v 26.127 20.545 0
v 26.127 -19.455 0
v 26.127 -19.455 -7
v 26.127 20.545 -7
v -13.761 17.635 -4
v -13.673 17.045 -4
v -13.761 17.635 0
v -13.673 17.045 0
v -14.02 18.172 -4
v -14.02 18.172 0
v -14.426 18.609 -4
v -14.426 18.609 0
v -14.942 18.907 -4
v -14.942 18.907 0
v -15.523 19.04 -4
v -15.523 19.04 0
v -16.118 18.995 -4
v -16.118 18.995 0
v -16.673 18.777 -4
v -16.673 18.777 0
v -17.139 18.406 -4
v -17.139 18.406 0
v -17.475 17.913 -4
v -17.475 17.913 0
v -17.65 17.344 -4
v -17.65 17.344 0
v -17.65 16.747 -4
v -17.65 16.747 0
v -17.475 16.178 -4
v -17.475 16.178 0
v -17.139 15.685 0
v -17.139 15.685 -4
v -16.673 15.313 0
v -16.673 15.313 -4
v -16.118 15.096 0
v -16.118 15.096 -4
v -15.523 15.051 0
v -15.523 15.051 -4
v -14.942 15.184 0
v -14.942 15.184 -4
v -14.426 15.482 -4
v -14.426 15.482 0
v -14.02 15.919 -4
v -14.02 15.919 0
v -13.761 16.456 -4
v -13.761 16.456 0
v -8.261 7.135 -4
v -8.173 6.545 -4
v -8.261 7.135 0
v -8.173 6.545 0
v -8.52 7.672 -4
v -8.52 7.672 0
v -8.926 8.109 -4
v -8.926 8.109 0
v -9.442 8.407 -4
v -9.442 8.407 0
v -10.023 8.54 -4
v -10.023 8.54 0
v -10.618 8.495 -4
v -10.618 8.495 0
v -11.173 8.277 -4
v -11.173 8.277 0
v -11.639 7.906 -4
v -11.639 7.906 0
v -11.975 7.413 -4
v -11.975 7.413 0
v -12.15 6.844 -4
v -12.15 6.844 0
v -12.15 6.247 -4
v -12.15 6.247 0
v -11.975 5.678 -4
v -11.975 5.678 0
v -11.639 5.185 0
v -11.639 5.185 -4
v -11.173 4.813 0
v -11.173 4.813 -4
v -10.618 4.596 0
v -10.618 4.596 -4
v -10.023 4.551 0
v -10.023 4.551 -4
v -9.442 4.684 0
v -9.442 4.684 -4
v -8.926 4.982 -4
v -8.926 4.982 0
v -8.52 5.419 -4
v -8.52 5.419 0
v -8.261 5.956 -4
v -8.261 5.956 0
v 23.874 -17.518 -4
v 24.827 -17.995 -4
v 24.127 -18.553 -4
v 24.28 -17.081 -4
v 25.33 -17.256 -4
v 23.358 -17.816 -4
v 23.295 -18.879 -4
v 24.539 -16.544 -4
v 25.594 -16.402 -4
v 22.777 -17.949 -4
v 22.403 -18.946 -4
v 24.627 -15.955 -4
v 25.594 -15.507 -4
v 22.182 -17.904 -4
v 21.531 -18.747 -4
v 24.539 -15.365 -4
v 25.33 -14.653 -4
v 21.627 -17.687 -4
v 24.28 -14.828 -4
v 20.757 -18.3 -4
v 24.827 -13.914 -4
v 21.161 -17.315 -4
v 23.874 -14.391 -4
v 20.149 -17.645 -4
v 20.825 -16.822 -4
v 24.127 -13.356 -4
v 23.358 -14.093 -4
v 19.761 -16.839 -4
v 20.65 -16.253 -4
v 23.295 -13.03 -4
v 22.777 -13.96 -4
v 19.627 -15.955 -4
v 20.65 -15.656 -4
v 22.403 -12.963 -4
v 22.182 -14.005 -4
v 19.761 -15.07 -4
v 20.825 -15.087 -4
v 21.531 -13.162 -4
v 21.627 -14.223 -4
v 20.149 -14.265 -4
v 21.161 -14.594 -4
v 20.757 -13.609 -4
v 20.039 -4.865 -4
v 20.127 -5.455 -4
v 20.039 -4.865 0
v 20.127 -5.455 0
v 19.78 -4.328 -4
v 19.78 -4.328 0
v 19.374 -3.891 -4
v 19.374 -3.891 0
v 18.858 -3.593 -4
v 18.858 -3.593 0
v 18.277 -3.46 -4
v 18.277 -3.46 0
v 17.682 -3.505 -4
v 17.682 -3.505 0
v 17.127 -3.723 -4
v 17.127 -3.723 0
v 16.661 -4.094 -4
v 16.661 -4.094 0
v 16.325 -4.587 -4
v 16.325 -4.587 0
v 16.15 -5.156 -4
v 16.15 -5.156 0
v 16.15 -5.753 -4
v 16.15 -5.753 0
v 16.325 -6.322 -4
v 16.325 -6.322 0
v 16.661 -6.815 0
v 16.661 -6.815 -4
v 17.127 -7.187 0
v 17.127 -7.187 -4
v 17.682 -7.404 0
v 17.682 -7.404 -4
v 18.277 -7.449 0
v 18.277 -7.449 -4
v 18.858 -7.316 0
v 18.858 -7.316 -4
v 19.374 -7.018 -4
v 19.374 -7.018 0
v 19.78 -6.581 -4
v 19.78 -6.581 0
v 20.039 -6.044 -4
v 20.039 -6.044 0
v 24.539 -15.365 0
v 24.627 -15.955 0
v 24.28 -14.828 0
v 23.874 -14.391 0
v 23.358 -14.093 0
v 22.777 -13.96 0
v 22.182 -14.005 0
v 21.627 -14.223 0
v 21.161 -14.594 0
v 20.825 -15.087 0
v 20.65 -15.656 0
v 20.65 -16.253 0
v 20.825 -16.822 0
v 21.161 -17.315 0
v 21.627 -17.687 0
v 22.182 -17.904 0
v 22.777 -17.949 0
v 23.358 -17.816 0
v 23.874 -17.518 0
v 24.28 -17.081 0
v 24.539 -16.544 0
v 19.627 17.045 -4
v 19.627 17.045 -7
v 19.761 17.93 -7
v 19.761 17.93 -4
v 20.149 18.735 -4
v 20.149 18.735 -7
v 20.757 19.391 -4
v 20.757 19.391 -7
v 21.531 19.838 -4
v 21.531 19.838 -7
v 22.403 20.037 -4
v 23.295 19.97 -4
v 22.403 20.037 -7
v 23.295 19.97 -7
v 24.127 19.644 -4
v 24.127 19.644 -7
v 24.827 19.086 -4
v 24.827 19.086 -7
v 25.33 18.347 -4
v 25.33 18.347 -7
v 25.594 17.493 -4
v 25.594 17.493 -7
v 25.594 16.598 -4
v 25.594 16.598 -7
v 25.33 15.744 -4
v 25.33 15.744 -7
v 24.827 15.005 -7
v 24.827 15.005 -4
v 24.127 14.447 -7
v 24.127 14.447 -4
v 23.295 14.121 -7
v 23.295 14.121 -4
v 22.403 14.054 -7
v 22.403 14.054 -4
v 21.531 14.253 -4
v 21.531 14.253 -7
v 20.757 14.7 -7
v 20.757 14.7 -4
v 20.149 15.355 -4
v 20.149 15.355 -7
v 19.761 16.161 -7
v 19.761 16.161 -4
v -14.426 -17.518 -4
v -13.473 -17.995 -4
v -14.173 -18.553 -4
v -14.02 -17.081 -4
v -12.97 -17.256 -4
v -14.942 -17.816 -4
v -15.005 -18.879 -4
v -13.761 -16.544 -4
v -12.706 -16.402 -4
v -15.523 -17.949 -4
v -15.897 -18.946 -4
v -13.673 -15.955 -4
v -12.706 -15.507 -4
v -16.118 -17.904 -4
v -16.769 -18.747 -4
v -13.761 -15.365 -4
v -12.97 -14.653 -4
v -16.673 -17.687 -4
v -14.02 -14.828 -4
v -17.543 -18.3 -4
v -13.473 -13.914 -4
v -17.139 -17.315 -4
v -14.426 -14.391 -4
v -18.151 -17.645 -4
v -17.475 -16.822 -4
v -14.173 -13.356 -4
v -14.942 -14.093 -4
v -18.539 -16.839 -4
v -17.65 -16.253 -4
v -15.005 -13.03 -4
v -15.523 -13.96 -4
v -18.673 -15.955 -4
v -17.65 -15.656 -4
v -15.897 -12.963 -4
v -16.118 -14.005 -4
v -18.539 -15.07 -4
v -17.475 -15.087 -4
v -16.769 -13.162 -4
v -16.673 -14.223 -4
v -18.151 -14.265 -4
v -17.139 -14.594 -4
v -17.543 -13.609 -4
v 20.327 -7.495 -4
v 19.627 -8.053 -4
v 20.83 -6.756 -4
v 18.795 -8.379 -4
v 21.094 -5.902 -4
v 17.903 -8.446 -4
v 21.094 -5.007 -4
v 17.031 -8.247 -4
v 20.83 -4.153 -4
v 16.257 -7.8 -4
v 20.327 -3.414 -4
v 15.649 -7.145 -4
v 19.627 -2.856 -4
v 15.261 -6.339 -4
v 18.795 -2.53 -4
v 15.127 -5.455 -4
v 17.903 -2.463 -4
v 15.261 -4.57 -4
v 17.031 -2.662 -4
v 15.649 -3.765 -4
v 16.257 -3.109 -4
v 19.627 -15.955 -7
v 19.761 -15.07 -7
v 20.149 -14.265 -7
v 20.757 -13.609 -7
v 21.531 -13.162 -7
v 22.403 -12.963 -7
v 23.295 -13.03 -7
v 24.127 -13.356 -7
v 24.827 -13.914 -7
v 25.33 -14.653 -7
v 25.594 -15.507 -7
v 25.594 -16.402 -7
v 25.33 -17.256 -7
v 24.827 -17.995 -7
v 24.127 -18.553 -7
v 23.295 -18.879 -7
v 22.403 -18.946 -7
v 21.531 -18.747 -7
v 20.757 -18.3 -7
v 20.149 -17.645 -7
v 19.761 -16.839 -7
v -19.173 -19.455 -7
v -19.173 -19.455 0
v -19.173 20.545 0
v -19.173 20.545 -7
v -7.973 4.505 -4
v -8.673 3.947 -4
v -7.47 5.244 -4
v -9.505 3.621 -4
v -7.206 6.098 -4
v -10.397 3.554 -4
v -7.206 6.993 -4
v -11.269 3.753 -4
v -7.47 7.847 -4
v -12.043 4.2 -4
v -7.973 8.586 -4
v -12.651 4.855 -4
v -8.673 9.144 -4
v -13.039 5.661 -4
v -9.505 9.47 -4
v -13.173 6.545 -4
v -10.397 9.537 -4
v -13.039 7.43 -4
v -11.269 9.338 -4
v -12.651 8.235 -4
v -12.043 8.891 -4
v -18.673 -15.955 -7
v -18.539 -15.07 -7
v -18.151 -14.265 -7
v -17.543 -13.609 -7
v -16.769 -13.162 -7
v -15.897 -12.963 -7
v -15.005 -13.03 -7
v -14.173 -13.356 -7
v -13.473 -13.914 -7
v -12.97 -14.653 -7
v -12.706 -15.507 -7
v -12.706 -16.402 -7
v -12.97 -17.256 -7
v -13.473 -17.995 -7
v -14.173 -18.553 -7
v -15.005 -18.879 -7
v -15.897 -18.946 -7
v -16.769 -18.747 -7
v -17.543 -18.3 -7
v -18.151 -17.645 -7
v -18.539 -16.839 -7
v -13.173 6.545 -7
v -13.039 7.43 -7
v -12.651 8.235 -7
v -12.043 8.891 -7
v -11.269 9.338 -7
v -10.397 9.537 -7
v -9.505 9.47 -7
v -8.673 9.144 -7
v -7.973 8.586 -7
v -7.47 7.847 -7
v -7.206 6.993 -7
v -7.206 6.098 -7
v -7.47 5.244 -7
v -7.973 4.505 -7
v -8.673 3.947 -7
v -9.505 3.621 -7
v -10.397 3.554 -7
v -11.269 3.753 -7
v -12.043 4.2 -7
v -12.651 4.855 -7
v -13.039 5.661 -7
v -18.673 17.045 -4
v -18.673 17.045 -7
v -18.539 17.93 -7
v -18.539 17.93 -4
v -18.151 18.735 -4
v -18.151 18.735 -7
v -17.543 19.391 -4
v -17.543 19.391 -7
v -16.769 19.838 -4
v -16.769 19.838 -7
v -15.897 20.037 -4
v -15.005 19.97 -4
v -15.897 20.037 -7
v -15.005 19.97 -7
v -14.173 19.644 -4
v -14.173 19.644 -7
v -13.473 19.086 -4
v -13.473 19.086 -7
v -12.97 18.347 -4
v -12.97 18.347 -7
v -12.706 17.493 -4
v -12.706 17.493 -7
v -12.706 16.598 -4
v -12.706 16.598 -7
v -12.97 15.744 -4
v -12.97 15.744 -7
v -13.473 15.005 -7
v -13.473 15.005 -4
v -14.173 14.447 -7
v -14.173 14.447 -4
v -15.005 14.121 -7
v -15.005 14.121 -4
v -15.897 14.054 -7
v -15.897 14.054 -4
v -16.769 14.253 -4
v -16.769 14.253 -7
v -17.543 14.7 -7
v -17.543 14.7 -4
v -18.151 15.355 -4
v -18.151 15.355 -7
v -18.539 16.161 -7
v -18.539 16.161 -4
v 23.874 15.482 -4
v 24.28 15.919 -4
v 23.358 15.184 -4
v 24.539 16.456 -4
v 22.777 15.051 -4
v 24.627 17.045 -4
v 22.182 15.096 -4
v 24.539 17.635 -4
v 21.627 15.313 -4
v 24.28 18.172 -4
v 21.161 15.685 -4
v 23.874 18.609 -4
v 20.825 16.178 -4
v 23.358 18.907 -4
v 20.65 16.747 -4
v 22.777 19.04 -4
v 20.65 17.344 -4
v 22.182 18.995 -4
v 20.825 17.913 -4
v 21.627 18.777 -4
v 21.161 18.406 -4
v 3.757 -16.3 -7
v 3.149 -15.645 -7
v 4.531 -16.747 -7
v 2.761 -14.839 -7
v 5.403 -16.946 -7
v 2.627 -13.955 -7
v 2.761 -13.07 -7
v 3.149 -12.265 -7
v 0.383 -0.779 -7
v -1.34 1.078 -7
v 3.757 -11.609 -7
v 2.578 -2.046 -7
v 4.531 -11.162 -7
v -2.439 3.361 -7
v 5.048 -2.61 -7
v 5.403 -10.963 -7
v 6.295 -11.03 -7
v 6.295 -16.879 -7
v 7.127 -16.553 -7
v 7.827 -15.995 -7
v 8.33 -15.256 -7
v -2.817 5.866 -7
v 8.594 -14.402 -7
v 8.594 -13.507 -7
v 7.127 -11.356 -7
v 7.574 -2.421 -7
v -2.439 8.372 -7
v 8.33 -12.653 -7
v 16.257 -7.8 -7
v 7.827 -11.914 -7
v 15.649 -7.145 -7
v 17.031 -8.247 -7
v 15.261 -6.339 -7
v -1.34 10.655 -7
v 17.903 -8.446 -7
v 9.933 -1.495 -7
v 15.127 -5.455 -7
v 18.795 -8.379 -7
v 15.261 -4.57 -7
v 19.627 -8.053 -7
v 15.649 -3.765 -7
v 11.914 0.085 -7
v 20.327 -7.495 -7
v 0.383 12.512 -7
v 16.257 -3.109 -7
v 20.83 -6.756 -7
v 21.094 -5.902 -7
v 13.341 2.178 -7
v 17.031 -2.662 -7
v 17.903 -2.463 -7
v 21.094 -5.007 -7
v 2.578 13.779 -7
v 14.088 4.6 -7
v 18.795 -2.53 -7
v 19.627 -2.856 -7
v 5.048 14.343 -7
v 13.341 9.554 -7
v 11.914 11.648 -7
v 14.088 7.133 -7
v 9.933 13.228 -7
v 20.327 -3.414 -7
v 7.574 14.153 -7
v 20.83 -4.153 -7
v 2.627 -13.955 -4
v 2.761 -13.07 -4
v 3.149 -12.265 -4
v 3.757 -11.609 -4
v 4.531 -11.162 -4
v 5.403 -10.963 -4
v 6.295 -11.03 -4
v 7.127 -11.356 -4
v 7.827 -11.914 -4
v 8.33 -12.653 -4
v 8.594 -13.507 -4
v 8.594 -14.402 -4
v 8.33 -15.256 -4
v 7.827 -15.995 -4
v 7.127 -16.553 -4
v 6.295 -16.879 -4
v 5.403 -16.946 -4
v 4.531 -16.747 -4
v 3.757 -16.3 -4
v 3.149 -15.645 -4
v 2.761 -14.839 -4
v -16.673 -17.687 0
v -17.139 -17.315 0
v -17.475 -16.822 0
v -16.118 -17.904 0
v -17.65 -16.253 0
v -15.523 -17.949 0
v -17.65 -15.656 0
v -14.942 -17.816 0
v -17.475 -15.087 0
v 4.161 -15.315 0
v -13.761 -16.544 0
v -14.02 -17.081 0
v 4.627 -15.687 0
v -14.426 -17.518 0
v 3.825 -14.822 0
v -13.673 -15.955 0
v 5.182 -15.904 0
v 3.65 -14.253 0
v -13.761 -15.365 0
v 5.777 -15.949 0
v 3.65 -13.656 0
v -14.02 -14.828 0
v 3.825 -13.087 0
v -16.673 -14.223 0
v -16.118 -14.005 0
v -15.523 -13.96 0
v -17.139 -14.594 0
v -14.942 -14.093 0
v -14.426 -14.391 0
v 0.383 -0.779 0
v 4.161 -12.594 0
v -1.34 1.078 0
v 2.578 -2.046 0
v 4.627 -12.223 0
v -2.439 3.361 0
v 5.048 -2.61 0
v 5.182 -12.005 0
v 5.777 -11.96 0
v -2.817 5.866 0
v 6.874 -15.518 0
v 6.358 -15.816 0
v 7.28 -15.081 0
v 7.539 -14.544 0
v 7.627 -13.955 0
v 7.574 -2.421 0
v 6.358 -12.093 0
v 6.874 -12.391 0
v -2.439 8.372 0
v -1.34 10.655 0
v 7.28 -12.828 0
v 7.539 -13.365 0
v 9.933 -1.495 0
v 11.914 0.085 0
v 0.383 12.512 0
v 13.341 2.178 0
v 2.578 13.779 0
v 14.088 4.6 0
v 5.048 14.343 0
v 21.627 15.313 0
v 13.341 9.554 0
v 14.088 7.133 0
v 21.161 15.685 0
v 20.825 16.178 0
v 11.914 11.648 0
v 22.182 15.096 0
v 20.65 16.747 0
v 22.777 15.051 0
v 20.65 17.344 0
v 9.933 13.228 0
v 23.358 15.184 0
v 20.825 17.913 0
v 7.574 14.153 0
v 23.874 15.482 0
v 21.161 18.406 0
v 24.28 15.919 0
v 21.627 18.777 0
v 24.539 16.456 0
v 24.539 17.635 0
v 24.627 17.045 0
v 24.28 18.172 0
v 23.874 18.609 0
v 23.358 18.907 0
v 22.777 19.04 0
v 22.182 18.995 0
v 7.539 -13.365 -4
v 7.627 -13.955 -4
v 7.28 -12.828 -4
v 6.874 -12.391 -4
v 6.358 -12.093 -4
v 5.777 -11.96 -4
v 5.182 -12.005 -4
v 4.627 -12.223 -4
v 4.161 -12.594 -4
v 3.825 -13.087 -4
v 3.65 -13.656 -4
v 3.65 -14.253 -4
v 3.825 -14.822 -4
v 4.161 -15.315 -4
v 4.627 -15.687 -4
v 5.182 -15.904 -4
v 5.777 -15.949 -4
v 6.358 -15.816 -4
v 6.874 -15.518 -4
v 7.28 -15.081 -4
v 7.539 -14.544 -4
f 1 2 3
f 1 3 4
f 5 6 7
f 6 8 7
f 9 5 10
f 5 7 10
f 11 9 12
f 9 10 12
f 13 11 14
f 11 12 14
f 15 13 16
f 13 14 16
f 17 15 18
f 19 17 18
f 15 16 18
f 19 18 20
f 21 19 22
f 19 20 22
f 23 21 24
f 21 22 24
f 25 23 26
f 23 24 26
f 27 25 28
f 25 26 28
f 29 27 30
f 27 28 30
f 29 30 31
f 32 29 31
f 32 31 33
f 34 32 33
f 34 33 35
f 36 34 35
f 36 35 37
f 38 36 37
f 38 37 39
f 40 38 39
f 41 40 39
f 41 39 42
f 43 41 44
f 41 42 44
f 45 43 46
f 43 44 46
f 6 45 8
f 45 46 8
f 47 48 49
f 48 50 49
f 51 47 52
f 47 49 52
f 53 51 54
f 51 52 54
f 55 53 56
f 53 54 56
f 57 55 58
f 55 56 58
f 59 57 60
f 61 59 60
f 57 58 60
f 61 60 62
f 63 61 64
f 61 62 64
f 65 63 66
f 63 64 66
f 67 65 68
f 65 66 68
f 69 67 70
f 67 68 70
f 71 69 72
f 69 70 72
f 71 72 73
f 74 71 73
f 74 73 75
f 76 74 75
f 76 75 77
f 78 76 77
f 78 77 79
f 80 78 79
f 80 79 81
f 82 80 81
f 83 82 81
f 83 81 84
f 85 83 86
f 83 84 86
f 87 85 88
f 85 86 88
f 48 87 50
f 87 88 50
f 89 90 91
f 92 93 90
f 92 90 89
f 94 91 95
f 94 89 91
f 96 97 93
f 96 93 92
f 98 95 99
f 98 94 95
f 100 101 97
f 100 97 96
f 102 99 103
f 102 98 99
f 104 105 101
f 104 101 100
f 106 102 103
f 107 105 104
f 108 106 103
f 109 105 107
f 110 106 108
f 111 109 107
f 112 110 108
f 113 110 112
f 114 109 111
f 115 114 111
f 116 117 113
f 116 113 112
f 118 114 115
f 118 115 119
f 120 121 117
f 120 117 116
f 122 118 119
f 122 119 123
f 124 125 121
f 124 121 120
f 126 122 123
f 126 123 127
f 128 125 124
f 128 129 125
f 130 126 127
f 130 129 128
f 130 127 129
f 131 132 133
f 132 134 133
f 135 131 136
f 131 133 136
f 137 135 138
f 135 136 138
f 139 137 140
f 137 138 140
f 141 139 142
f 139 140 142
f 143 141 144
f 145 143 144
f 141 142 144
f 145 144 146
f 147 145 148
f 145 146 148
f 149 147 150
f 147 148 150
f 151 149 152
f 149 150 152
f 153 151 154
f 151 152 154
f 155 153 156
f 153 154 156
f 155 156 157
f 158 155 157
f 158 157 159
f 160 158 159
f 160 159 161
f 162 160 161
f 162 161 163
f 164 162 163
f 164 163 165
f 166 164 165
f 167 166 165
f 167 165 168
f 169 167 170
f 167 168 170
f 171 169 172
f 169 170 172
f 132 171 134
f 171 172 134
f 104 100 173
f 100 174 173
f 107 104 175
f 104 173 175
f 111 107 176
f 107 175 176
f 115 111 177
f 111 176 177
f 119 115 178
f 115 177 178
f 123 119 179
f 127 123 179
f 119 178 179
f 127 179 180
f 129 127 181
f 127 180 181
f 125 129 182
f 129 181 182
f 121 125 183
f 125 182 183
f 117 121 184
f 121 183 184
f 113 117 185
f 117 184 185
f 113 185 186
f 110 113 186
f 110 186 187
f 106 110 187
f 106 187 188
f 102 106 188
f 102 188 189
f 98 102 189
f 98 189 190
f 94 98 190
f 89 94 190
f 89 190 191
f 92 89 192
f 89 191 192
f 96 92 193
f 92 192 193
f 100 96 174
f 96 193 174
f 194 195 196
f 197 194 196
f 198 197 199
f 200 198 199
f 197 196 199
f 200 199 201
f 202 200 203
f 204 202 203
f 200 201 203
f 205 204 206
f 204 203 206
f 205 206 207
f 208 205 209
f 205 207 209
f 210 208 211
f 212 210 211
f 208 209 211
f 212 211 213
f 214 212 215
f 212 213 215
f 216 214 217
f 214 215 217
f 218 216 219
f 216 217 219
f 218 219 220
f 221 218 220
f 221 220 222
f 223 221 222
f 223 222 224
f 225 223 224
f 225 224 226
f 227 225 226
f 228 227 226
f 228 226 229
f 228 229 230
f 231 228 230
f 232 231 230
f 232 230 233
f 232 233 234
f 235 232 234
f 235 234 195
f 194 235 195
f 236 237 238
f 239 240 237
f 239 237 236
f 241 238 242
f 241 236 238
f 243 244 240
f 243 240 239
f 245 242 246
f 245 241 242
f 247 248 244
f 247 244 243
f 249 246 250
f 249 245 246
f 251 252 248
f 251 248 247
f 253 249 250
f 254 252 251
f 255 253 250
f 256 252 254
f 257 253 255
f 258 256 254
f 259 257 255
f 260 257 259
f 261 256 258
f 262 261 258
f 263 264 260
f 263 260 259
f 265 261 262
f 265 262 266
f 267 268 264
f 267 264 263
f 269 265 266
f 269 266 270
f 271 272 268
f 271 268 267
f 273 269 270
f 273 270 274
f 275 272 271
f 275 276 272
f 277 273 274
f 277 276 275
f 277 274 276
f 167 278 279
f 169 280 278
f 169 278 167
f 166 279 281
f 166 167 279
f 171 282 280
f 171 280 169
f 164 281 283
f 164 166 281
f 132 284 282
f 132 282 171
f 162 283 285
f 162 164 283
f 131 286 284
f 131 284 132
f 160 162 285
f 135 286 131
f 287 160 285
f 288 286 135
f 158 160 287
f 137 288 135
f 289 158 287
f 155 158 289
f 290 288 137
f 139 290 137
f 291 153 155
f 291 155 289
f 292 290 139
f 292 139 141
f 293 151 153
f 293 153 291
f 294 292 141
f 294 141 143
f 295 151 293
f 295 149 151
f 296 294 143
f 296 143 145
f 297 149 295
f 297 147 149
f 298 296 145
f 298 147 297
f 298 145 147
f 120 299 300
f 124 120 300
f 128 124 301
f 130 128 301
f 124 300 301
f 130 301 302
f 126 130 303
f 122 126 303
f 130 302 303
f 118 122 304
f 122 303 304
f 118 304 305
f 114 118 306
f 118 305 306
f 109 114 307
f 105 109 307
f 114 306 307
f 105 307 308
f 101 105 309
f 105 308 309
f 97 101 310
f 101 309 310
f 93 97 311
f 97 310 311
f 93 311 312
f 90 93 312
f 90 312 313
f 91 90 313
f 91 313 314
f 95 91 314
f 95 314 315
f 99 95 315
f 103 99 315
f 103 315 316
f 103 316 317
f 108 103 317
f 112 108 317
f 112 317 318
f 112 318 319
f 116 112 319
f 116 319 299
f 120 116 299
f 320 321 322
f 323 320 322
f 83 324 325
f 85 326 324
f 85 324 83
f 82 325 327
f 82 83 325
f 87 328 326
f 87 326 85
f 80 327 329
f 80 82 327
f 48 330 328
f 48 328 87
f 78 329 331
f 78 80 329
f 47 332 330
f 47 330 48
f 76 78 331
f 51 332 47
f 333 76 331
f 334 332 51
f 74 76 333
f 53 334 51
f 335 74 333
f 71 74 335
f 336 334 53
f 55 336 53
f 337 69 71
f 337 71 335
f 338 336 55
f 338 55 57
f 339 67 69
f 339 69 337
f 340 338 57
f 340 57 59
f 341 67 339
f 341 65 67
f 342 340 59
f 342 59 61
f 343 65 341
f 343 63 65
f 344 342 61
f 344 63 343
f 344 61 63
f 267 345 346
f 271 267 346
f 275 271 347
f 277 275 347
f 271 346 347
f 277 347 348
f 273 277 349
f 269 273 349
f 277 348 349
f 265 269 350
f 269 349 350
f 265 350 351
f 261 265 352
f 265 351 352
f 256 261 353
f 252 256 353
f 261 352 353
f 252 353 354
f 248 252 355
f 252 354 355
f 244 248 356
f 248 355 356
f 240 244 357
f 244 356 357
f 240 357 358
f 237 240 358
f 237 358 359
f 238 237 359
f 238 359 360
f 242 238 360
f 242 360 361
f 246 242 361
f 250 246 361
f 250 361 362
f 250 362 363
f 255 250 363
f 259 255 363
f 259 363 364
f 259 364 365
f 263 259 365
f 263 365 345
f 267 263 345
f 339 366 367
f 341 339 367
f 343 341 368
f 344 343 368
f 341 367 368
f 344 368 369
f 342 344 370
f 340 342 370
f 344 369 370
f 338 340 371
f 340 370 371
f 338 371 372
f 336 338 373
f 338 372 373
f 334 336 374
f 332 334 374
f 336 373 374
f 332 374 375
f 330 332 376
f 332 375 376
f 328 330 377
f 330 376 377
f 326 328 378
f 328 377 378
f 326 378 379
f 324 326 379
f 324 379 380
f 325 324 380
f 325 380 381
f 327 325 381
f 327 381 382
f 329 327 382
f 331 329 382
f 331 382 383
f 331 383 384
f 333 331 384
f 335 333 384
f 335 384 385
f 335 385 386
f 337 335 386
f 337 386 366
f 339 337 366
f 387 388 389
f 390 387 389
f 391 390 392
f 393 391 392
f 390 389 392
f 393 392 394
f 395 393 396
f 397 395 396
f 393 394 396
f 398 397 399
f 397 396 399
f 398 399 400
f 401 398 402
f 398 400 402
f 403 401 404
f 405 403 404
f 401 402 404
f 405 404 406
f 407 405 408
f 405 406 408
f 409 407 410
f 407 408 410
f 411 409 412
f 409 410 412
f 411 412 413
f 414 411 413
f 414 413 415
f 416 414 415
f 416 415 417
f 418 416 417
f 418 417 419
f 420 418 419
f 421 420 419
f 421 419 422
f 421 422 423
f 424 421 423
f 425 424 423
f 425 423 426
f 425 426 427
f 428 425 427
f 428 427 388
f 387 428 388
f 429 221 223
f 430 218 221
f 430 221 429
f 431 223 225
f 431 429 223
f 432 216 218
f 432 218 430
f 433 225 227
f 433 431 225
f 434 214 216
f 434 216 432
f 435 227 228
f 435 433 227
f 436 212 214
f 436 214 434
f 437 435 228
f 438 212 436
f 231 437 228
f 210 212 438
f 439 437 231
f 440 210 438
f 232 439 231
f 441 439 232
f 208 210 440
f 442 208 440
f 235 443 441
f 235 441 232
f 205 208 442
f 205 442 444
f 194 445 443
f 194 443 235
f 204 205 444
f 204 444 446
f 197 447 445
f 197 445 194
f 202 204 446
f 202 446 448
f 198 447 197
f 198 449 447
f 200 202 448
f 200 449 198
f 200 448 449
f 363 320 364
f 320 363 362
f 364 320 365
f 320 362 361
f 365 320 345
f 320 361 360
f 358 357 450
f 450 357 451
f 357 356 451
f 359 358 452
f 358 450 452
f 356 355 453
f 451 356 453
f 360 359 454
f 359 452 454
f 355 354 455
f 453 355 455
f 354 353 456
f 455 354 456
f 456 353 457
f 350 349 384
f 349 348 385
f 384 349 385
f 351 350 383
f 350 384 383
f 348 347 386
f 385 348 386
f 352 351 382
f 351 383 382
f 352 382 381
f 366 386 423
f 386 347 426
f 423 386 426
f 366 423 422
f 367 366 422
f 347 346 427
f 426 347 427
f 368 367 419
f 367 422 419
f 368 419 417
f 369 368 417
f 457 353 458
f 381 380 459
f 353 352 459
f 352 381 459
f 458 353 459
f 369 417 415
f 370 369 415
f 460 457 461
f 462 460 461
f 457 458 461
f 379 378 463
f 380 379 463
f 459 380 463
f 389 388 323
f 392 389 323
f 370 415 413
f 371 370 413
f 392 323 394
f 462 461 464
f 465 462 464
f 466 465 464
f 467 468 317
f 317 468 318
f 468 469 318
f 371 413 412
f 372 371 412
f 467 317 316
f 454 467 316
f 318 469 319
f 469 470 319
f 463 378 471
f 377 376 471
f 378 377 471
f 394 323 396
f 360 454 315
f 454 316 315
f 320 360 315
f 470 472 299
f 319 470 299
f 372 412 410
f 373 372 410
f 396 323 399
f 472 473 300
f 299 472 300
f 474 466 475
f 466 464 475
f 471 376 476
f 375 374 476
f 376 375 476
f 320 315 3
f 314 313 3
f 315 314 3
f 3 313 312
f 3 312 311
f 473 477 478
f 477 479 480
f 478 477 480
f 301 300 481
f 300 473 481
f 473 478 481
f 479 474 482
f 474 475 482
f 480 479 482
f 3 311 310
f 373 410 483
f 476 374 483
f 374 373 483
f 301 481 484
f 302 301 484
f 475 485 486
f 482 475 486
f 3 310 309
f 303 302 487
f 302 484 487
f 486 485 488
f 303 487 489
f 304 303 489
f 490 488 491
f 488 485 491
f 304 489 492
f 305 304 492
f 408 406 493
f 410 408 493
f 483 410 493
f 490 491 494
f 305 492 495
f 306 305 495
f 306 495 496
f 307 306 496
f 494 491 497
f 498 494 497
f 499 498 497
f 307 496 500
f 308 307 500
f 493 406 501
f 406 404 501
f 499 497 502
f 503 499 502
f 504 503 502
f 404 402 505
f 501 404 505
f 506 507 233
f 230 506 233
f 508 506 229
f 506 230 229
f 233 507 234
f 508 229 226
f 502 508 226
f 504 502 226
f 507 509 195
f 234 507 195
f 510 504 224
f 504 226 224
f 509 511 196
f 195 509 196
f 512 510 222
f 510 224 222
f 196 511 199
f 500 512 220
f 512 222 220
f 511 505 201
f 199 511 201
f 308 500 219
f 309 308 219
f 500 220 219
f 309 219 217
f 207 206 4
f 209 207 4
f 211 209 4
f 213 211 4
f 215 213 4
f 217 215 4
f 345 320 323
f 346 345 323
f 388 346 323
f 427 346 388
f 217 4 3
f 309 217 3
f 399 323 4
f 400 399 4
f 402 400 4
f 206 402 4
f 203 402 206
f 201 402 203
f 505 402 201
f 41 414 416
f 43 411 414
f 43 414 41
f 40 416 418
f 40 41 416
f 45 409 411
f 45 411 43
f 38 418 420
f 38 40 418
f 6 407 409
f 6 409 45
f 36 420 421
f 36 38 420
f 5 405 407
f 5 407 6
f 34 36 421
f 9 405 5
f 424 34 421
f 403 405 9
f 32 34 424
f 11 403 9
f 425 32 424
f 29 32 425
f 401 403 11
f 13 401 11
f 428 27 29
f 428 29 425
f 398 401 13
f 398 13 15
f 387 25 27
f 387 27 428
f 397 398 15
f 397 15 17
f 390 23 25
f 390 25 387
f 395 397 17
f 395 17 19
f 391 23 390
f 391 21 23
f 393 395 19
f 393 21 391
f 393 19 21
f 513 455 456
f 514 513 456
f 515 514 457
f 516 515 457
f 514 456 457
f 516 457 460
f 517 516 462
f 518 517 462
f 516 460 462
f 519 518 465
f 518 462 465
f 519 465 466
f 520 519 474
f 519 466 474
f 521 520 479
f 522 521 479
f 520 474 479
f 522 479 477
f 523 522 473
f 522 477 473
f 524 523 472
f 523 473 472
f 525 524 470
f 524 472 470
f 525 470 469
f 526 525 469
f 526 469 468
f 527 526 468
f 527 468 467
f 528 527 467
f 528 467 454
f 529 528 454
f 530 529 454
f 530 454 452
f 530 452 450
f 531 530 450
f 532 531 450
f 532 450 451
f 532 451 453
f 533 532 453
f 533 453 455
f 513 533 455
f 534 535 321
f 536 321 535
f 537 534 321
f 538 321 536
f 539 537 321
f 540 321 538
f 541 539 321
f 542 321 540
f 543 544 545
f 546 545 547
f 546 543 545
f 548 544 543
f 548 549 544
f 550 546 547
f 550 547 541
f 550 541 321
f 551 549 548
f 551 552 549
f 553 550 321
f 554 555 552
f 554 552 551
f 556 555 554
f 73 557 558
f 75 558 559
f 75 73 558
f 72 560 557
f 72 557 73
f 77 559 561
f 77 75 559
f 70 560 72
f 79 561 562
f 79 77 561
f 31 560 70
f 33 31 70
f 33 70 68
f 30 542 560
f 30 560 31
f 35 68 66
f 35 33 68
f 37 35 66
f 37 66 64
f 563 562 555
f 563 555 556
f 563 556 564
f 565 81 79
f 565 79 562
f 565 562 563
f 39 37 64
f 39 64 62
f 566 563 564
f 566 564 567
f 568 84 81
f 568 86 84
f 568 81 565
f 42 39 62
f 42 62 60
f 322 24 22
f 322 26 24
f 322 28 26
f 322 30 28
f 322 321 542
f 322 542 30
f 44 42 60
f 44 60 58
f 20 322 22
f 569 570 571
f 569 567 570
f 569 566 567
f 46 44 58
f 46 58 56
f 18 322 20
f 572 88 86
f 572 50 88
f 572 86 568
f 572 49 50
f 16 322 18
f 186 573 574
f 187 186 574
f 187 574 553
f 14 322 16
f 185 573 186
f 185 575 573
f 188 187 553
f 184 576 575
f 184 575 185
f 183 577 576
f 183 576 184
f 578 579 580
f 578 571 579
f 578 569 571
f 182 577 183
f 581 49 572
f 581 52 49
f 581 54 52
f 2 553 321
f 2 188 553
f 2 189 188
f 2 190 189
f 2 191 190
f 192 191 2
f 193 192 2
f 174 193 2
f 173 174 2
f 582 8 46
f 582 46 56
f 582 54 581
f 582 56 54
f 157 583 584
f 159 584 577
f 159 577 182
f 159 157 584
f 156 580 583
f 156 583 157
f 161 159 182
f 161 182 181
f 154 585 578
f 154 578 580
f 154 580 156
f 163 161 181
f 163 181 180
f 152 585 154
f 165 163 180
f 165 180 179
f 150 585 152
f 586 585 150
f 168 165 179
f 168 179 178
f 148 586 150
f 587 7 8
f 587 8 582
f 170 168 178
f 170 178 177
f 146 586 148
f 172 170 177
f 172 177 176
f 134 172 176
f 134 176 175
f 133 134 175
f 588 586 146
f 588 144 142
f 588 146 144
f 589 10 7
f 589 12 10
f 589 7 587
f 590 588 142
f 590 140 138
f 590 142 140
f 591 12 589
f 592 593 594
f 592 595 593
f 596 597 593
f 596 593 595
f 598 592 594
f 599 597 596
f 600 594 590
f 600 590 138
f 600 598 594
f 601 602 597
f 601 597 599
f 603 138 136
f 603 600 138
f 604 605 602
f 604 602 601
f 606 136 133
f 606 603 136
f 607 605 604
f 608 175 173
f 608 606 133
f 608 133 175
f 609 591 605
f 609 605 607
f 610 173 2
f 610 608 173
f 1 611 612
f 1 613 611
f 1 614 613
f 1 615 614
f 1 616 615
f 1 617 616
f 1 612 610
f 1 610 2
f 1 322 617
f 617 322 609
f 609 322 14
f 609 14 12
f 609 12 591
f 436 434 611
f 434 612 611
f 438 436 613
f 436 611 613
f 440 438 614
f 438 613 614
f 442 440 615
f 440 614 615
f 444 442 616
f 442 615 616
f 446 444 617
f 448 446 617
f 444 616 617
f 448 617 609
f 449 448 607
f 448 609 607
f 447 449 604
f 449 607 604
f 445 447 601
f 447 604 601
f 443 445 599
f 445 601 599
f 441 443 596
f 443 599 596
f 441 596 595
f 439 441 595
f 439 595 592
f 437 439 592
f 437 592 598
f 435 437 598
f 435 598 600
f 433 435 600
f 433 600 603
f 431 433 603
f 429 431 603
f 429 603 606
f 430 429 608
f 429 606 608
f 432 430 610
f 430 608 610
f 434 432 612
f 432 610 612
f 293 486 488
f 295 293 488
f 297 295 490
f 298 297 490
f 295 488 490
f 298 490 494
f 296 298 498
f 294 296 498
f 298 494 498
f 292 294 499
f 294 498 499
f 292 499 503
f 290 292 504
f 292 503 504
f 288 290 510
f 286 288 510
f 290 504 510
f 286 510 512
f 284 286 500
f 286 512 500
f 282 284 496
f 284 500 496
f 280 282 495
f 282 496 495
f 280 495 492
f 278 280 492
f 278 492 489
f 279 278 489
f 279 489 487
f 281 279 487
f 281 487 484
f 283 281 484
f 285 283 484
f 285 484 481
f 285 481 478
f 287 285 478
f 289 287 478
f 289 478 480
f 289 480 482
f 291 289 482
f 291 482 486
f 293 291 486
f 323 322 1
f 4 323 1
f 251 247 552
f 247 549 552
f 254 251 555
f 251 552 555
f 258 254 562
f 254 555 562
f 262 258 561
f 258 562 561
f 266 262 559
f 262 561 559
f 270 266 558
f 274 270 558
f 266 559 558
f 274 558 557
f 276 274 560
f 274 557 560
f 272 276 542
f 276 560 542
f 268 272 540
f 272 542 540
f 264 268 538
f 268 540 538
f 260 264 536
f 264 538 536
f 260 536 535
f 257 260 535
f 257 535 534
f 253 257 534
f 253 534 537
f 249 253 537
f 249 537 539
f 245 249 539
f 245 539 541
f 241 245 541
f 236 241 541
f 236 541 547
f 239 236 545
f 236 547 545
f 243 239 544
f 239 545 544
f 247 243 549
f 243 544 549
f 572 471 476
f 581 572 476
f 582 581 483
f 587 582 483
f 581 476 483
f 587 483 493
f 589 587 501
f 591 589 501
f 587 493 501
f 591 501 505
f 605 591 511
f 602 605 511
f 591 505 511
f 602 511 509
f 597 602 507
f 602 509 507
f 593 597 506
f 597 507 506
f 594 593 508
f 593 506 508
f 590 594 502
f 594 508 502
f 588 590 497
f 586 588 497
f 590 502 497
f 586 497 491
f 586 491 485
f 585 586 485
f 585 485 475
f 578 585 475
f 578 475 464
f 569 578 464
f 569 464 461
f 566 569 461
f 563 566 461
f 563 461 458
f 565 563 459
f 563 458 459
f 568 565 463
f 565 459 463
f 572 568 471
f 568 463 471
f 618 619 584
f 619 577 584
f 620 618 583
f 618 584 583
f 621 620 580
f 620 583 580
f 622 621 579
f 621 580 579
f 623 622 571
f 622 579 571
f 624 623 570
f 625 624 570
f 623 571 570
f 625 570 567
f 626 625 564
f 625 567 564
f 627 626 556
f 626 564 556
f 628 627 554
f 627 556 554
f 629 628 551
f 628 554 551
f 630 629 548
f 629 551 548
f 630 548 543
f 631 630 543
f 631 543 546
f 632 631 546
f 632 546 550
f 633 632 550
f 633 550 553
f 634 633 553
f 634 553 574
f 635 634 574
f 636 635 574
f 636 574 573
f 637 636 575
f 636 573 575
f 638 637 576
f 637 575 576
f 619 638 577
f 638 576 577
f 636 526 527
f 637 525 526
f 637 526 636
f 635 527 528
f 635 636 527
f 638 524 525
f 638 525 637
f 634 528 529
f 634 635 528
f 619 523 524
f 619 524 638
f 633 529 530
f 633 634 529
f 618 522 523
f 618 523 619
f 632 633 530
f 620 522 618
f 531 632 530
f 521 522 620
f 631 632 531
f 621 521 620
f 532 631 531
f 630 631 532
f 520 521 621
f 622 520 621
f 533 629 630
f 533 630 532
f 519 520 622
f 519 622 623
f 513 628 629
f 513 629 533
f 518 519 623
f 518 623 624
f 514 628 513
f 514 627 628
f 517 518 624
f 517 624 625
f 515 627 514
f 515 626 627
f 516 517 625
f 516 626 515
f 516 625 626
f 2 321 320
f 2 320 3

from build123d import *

# Parameters (mm, degrees)
ESQUISSE1_W                                       = 45.3
ESQUISSE1_H                                       = 40
BOSS_EXTRU_1_DEPTH                                = 7
CHAMBRAGE_POUR_VIS_SIX_PANS_CREUX_M42_D           = 4
CHAMBRAGE_POUR_VIS_SIX_PANS_CREUX_M42_CBORE_D     = 6
CHAMBRAGE_POUR_VIS_SIX_PANS_CREUX_M42_CBORE_DEPTH = 3
ESQUISSE8_R                                       = 8.5
ENL_V_MAT_EXTRU_1_DEPTH                           = 7
CHAMBRAGE_POUR_VIS_SIX_PANS_CREUX_M43_D           = 4
CHAMBRAGE_POUR_VIS_SIX_PANS_CREUX_M43_CBORE_D     = 6
CHAMBRAGE_POUR_VIS_SIX_PANS_CREUX_M43_CBORE_DEPTH = 3


with BuildPart() as part:
    # Esquisse1 → Boss.-Extru.1 (new body)
    with BuildSketch(Plane.XY):
        with Locations((3.477385892, 0.545435685)):
            Rectangle(ESQUISSE1_W, ESQUISSE1_H)
    extrude(amount=-BOSS_EXTRU_1_DEPTH)

    # Chambrage pour vis à six pans creux M42 (through all)
    with Locations(Plane(origin=(0, 0, -7), x_dir=(-1, 0, 0), z_dir=(0, 0, -1))):
        with Locations((-22.627385892, 17.045435685), (15.672614108, 17.045435685), (15.672614108, -15.954564315), (-22.627385892, -15.954564315)):
            CounterBoreHole(CHAMBRAGE_POUR_VIS_SIX_PANS_CREUX_M42_D / 2, CHAMBRAGE_POUR_VIS_SIX_PANS_CREUX_M42_CBORE_D / 2, CHAMBRAGE_POUR_VIS_SIX_PANS_CREUX_M42_CBORE_DEPTH)

    # Esquisse8 → Enlèv. mat.-Extru.1 (cut)
    with BuildSketch(Plane(origin=(0, 0, -7), x_dir=(-1, 0, 0), z_dir=(0, 0, -1))):
        with Locations((-5.682958625, 5.866379902)):
            Circle(ESQUISSE8_R)
    extrude(amount=-ENL_V_MAT_EXTRU_1_DEPTH, mode=Mode.SUBTRACT)

    # Chambrage pour vis à six pans creux M43 (through all)
    with Locations(Plane(origin=(0, 0, -7), x_dir=(-1, 0, 0), z_dir=(0, 0, -1))):
        with Locations((-5.627385892, -13.954564315), (-18.127385892, -5.454564315), (10.172614108, 6.545435685)):
            CounterBoreHole(CHAMBRAGE_POUR_VIS_SIX_PANS_CREUX_M43_D / 2, CHAMBRAGE_POUR_VIS_SIX_PANS_CREUX_M43_CBORE_D / 2, CHAMBRAGE_POUR_VIS_SIX_PANS_CREUX_M43_CBORE_DEPTH)


solid = part.part
